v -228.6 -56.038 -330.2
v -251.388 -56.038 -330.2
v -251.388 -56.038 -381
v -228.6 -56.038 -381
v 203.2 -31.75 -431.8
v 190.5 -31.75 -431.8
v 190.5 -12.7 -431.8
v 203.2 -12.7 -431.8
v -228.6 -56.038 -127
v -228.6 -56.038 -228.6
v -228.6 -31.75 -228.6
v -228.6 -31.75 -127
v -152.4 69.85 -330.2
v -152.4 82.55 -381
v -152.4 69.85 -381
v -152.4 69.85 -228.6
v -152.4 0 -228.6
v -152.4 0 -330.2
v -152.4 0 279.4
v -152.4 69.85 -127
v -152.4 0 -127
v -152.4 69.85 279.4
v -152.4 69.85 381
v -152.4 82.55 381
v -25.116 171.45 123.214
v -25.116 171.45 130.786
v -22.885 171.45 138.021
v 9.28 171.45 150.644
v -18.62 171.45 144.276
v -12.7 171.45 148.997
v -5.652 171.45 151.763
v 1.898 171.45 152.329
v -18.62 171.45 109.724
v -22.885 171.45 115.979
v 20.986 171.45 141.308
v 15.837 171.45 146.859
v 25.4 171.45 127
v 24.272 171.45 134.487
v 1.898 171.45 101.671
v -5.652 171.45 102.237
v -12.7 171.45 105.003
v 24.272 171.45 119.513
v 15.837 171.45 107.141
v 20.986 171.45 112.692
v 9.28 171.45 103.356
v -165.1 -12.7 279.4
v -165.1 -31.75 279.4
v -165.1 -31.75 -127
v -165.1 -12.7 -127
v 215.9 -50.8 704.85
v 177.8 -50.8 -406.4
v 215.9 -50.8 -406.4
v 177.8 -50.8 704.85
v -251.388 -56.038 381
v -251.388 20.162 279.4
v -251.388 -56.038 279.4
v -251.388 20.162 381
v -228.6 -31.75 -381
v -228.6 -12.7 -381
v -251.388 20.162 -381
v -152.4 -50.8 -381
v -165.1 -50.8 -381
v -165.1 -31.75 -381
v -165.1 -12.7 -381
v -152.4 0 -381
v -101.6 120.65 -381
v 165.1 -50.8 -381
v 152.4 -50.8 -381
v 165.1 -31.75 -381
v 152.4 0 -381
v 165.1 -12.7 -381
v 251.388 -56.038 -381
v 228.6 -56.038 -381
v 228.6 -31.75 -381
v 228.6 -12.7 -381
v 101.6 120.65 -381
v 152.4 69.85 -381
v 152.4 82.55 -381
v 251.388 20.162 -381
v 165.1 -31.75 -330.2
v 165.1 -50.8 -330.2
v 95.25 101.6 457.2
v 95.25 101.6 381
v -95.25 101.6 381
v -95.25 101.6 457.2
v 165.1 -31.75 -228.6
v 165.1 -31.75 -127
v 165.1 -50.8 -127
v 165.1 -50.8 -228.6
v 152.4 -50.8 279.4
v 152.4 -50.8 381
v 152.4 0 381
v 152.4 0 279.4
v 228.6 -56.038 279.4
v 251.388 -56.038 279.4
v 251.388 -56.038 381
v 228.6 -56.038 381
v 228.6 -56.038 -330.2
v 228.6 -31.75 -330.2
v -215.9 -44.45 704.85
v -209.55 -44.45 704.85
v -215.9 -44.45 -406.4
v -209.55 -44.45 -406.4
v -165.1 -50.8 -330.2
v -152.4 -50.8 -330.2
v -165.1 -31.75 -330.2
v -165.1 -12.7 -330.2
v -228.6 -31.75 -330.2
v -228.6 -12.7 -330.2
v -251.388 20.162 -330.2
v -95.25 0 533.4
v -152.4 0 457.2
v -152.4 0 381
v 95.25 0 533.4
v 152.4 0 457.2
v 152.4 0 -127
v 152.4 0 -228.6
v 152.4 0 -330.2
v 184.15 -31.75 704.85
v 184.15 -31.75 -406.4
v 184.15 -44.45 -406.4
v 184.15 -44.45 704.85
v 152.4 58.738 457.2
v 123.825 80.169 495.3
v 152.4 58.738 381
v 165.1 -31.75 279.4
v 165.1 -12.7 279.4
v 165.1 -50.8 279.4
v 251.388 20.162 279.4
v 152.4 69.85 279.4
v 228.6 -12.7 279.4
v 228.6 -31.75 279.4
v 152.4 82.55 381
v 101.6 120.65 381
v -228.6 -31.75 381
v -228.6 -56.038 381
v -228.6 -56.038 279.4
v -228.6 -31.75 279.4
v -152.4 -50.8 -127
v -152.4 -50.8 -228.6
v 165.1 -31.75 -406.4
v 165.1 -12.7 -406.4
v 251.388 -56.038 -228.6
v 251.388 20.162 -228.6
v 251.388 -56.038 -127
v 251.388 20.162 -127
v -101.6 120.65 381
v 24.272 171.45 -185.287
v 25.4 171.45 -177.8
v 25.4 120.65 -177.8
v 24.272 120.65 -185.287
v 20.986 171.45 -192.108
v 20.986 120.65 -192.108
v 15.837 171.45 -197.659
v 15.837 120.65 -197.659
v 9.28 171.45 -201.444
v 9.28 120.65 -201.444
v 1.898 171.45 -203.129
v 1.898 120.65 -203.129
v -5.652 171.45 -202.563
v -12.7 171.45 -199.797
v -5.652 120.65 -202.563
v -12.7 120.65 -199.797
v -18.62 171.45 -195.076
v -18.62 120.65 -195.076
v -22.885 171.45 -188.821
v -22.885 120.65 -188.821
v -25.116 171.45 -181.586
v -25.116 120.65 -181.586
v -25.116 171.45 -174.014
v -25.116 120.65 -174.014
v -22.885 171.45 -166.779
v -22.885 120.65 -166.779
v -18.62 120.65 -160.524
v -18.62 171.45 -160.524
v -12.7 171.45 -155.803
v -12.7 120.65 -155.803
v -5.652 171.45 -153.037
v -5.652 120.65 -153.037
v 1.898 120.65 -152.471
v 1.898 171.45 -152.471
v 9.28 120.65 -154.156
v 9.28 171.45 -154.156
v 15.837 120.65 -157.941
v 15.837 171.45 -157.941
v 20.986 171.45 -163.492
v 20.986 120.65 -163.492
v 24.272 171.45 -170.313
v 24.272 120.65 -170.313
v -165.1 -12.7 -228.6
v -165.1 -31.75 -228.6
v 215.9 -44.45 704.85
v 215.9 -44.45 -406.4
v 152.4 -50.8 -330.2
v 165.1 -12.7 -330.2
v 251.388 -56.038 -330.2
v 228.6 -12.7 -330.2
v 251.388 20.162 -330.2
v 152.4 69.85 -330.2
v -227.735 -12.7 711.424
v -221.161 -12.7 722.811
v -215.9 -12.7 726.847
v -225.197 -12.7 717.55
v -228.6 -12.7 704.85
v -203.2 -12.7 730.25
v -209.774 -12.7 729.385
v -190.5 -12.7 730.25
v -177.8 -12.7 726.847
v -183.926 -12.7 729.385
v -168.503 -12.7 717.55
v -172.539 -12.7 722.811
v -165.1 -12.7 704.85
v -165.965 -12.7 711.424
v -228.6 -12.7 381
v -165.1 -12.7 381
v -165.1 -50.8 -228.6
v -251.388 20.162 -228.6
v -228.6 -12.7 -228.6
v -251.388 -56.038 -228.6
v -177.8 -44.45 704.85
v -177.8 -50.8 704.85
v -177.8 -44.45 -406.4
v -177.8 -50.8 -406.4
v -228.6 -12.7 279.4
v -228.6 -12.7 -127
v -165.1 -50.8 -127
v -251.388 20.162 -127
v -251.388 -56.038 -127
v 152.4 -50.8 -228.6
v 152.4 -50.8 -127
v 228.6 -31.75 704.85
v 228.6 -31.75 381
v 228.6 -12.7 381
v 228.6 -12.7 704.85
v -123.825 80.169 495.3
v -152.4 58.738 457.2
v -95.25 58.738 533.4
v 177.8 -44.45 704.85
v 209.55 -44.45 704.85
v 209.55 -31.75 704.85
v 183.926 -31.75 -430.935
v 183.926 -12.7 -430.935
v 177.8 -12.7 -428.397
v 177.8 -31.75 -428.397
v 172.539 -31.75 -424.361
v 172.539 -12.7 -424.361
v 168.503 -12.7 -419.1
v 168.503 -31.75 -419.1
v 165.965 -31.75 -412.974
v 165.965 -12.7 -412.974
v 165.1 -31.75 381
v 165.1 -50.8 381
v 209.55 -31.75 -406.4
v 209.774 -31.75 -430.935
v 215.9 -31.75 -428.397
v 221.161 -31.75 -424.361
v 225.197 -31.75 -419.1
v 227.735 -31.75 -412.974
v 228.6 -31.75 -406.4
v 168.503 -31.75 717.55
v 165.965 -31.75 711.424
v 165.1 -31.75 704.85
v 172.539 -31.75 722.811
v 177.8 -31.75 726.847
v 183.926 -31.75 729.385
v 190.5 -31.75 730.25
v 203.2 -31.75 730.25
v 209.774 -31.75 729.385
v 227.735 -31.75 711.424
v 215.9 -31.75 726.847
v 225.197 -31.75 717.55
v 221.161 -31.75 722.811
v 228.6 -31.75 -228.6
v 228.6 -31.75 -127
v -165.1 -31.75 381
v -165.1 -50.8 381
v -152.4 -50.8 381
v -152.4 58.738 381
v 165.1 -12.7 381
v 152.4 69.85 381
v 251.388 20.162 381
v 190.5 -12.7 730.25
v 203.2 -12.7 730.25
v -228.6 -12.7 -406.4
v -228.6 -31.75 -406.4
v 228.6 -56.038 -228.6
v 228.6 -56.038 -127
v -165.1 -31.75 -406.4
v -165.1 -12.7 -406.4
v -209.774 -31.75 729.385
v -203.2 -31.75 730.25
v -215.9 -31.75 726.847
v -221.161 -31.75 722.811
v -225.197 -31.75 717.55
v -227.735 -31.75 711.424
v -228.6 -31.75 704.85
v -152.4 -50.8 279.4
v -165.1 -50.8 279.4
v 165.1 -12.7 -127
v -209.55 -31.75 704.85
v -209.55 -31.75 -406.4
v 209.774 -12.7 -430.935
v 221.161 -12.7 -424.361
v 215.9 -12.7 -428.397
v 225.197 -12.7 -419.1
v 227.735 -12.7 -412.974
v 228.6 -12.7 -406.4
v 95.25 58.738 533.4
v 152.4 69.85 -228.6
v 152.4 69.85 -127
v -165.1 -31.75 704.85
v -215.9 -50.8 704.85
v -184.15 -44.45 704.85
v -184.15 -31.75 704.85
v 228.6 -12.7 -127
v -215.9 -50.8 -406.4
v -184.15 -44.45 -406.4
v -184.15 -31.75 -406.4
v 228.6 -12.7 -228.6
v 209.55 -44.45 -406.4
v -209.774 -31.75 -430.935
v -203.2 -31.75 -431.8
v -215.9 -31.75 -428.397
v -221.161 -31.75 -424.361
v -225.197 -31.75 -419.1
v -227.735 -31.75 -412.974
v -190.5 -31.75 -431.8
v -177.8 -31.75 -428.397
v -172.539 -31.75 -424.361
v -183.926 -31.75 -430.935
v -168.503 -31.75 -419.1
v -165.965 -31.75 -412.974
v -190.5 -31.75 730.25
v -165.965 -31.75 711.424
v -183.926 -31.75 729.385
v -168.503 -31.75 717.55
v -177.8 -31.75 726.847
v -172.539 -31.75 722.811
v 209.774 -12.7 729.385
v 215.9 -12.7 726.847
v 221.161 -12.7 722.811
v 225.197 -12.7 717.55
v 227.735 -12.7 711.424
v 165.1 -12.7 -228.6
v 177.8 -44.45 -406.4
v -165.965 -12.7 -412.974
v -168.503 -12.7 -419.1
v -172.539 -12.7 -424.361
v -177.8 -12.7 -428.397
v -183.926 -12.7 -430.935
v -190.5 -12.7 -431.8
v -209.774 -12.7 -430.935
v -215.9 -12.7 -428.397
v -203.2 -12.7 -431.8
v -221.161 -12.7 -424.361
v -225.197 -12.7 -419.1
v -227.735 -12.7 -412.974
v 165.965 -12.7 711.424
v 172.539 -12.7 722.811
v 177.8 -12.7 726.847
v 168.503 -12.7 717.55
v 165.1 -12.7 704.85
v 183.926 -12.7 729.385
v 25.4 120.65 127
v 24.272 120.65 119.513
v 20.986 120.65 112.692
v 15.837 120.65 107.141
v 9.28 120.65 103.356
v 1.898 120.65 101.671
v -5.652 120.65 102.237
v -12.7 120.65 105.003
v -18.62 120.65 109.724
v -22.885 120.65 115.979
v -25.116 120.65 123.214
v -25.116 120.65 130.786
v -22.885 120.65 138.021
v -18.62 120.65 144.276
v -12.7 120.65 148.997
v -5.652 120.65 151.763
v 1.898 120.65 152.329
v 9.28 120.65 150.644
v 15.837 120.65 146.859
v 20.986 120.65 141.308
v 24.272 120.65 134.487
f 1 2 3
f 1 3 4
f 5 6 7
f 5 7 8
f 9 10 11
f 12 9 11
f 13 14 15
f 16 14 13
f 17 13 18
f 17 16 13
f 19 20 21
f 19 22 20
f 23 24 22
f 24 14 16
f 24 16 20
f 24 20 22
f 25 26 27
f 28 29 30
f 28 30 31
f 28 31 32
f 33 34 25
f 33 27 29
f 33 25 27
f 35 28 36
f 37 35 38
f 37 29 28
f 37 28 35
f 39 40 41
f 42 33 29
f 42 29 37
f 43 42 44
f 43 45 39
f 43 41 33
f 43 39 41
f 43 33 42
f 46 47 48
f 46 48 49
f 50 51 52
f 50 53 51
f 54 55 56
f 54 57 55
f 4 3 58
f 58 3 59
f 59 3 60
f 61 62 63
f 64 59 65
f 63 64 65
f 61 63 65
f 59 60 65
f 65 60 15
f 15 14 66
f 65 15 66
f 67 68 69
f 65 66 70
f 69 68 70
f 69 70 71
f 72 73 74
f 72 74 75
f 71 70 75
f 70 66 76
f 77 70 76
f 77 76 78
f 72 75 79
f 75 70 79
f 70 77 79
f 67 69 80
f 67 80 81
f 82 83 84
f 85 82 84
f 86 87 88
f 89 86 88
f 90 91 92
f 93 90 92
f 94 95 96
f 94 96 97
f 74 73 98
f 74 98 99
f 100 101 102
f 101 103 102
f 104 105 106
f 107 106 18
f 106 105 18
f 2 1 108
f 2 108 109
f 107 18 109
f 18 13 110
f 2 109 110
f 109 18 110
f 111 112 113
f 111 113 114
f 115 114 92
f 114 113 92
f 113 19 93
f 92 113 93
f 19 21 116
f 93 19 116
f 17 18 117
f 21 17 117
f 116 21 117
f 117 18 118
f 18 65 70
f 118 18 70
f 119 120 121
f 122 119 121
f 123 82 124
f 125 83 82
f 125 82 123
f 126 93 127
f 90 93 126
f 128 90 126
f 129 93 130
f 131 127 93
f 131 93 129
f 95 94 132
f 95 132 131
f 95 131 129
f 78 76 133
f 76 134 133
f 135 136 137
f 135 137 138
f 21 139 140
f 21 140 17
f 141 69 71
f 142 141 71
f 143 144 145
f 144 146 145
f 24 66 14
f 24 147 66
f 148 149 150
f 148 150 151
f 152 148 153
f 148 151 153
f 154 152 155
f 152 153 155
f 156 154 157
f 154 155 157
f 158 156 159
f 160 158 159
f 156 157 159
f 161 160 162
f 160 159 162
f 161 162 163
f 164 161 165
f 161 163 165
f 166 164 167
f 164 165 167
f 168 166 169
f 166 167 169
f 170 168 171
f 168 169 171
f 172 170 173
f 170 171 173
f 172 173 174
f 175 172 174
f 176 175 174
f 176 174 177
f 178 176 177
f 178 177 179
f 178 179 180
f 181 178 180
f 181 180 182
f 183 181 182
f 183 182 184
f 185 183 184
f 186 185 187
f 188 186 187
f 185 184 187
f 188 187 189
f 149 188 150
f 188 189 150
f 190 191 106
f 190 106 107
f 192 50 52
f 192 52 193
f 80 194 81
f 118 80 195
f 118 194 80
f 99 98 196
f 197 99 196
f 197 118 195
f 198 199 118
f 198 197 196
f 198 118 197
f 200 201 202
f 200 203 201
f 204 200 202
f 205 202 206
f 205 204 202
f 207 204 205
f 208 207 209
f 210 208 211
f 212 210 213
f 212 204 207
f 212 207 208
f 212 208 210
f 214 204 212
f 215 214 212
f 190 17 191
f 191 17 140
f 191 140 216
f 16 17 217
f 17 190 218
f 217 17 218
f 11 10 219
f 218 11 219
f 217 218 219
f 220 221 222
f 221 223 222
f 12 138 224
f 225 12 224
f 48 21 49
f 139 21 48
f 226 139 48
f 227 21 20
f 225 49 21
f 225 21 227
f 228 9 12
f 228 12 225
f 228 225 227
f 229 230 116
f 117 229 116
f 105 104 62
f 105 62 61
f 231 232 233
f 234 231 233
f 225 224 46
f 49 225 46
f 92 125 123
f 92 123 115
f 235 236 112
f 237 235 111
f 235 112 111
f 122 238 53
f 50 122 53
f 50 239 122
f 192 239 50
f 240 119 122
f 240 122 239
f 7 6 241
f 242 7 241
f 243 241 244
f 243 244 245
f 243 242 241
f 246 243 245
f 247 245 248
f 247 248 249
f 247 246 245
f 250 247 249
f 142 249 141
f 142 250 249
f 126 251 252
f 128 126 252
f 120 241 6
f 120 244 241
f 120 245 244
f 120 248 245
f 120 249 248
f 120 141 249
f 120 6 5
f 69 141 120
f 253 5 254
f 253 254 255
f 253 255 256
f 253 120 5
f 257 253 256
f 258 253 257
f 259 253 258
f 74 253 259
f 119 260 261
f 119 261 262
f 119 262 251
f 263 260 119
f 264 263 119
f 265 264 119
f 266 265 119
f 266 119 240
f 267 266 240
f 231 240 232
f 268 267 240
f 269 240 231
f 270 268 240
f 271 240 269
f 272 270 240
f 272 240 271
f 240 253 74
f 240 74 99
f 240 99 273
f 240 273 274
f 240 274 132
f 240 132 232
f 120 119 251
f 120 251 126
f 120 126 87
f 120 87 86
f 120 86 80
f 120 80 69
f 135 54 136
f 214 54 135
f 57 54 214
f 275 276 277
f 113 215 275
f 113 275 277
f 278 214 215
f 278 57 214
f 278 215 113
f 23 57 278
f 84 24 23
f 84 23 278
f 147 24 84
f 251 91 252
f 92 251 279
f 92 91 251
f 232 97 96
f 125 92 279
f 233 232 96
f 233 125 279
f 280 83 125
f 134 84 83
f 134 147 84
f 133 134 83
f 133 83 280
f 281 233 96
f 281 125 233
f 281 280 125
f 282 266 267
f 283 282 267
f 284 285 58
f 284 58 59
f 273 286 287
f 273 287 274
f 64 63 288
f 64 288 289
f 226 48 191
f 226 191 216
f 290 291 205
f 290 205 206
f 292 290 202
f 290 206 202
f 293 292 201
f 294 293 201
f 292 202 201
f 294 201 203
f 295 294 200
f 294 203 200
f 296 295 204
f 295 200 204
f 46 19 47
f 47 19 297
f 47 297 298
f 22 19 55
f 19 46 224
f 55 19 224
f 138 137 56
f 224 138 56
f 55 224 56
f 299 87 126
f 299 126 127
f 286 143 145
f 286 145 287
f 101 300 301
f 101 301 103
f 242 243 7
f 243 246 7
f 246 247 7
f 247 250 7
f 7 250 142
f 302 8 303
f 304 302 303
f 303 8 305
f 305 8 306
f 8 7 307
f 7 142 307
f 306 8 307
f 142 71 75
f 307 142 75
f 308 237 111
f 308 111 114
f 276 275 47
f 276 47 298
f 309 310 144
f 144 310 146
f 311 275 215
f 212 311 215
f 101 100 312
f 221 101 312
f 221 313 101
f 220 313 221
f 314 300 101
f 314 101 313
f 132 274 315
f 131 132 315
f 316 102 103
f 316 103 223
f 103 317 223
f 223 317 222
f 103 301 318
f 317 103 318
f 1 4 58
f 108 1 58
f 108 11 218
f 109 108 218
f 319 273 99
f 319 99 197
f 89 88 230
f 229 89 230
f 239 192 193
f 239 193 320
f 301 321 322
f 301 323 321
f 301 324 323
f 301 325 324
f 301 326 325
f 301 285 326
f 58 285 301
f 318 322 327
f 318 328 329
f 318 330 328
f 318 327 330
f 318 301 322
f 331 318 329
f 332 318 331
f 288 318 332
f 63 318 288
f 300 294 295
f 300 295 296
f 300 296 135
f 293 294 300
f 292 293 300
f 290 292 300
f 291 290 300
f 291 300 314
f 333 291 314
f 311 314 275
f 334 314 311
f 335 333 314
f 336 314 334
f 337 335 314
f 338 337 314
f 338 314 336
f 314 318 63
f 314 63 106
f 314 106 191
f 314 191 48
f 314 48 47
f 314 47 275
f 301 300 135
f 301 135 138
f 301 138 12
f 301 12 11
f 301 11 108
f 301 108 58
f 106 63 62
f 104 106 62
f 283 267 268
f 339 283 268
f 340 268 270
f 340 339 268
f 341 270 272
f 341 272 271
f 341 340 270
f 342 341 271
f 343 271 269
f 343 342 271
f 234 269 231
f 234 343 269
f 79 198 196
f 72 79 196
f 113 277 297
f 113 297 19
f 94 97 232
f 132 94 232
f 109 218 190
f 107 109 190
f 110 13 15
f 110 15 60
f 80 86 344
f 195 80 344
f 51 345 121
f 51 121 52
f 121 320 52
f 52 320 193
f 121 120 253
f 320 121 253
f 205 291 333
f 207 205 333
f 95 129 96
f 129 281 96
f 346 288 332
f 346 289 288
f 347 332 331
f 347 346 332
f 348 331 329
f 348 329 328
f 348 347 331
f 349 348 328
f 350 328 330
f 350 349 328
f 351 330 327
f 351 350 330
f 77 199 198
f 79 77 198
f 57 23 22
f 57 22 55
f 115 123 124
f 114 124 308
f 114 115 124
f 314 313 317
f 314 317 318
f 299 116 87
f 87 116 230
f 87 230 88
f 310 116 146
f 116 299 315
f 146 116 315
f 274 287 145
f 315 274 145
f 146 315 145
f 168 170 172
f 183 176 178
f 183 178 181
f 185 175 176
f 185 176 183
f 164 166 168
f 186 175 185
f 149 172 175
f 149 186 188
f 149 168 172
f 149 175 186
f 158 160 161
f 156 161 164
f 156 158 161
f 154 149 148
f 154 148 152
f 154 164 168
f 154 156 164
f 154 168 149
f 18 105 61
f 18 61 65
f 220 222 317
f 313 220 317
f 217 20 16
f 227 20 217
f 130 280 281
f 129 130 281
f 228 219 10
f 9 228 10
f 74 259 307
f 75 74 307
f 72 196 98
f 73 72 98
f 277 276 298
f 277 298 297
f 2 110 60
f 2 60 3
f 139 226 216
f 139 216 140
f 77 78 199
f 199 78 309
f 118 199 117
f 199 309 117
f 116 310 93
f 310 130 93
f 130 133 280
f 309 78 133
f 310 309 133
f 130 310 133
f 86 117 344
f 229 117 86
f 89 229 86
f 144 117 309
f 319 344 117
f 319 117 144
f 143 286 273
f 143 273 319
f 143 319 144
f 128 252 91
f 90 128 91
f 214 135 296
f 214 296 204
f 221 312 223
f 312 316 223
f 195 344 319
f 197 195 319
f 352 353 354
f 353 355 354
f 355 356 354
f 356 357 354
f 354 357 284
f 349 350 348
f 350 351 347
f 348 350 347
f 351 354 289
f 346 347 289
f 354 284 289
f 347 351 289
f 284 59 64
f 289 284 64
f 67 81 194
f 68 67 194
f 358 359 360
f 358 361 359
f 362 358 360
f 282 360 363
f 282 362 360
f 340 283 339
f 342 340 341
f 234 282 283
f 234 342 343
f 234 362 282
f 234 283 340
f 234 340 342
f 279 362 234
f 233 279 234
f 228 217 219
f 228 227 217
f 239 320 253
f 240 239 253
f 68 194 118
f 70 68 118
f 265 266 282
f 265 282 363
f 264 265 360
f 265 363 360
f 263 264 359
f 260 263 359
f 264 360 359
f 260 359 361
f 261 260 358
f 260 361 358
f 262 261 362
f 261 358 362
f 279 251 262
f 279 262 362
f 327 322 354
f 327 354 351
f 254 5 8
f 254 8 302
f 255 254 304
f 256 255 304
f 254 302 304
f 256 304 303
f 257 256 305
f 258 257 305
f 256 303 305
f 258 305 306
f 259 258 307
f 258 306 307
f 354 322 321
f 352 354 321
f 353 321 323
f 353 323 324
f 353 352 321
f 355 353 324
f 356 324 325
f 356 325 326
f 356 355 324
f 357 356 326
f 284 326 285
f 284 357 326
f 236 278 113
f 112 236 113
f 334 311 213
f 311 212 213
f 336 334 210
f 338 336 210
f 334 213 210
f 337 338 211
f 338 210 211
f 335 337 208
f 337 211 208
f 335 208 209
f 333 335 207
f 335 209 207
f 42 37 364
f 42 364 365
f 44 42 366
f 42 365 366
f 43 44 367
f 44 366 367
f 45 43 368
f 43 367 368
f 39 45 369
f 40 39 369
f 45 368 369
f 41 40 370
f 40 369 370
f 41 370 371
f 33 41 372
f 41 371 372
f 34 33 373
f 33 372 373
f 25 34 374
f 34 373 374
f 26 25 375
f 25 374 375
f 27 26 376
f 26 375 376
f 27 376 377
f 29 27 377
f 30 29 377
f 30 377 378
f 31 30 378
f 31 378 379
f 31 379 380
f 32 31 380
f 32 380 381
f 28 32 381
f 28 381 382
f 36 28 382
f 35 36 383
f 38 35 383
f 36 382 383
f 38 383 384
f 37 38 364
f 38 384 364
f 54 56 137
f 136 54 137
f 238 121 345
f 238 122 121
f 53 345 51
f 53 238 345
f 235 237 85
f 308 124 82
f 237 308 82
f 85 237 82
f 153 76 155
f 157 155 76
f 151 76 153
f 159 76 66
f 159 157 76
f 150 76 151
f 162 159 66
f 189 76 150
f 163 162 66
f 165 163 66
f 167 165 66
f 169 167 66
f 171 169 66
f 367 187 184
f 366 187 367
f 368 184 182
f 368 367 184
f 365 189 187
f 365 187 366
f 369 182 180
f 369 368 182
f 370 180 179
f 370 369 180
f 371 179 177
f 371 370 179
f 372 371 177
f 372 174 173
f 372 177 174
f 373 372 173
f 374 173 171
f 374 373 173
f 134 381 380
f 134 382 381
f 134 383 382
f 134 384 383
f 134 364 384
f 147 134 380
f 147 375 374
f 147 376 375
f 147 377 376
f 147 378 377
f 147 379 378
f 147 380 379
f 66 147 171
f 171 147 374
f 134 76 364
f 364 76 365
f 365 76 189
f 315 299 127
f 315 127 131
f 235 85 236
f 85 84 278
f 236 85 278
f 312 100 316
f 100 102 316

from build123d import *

# Parameters (mm, degrees)
BOSS_EXTRUDE1_DEPTH      = 381
SKETCH3_W                = 98.988046958
SKETCH3_H                = 406.4
SKETCH3_H_2              = 101.6
CUT_EXTRUDE1_DEPTH       = 121.65
CUT_EXTRUDE1_DEPTH_BACK  = 57.038415052
BOSS_EXTRUDE2_DEPTH      = 152.4
CUT_EXTRUDE2_DEPTH       = 252.388046958
CUT_EXTRUDE2_DEPTH_BACK  = 1
CUT_EXTRUDE3_DEPTH       = 121.65
CUT_EXTRUDE3_DEPTH_BACK  = 57.038415052
SKETCH8_W                = 63.5
SKETCH8_H                = 19.05
BOSS_EXTRUDE3_DEPTH      = 730.25
BOSS_EXTRUDE3_DEPTH_BACK = 431.8
FILLET1_R                = 25.4
BOSS_EXTRUDE4_DEPTH      = 704.85
BOSS_EXTRUDE4_DEPTH_BACK = 406.4
SKETCH10_R               = 25.4
BOSS_EXTRUDE5_DEPTH      = 50.8


with BuildPart() as part:
    # Sketch2 → Boss-Extrude1 (new body, symmetric)
    with BuildSketch(Plane.XY):
        Polygon((152.4, 0), (0, 0), (0, 120.65), (101.6, 120.65), (152.4, 82.55), (152.4, 69.85), (251.388046958, 20.161584948), (251.388046958, -56.038415052), (228.6, -56.038415052), (228.6, -12.7), (165.1, -12.7), (165.1, -50.8), (152.4, -50.8), align=None)
    extrude(amount=BOSS_EXTRUDE1_DEPTH, both=True)

    # Sketch3 → Cut-Extrude1 (cut, two sides)
    with BuildSketch(Plane(origin=(0, 0, 0), x_dir=(1, 0, 0), z_dir=(0, 1, 0))) as cut_extrude1_sk:
        with Locations((201.894023479, -76.2)):
            Rectangle(SKETCH3_W, SKETCH3_H)
        with Locations((201.894023479, 279.4)):
            Rectangle(SKETCH3_W, SKETCH3_H_2)
    extrude(amount=CUT_EXTRUDE1_DEPTH, mode=Mode.SUBTRACT)
    extrude(cut_extrude1_sk.sketch, amount=-CUT_EXTRUDE1_DEPTH_BACK, mode=Mode.SUBTRACT)

    # Sketch4 → Boss-Extrude2 (add)
    with BuildSketch(Plane.XY.offset(381)):
        Polygon((152.4, 0), (0, 0), (0, 101.6), (95.25, 101.6), (152.4, 58.7375), align=None)
    extrude(amount=BOSS_EXTRUDE2_DEPTH)

    # Sketch6 → Cut-Extrude2 (cut, two sides)
    with BuildSketch(Plane(origin=(0, 0, 0), x_dir=(0, 0, -1), z_dir=(1, 0, 0))) as cut_extrude2_sk:
        Polygon((-533.4, 101.6), (-533.4, 58.7375), (-457.2, 101.6), align=None)
    extrude(amount=CUT_EXTRUDE2_DEPTH, mode=Mode.SUBTRACT)
    extrude(cut_extrude2_sk.sketch, amount=-CUT_EXTRUDE2_DEPTH_BACK, mode=Mode.SUBTRACT)

    # Sketch7 → Cut-Extrude3 (cut, two sides)
    with BuildSketch(Plane(origin=(0, 0, 0), x_dir=(1, 0, 0), z_dir=(0, 1, 0))) as cut_extrude3_sk:
        Polygon((152.4, -533.4), (152.4, -457.2), (95.25, -533.4), align=None)
    extrude(amount=CUT_EXTRUDE3_DEPTH, mode=Mode.SUBTRACT)
    extrude(cut_extrude3_sk.sketch, amount=-CUT_EXTRUDE3_DEPTH_BACK, mode=Mode.SUBTRACT)

    # Mirror1: part across plane


with BuildPart() as part_1:
    add(part.part)
    add(part.part.mirror(Plane(origin=(0, 0, 0), x_dir=(0, 0, 1), z_dir=(1, 0, 0))))

    # Sketch8 → Boss-Extrude3 (add, two sides)
    with BuildSketch(Plane.XY) as boss_extrude3_sk:
        with Locations((-196.85, -22.225)):
            Rectangle(SKETCH8_W, SKETCH8_H)
        with Locations((196.85, -22.225)):
            Rectangle(SKETCH8_W, SKETCH8_H)
    extrude(amount=BOSS_EXTRUDE3_DEPTH)
    extrude(boss_extrude3_sk.sketch, amount=-BOSS_EXTRUDE3_DEPTH_BACK)

    # Fillet1
    fillet1_edges = [part_1.edges().sort_by_distance(p)[0] for p in [
        (-165.1, -22.225, 730.25),
        (-228.6, -22.225, 730.25),
        (-228.6, -22.225, -431.8),
        (-165.1, -22.225, -431.8),
        (228.6, -22.225, 730.25),
        (165.1, -22.225, 730.25),
        (165.1, -22.225, -431.8),
        (228.6, -22.225, -431.8),
    ]]
    fillet(fillet1_edges, radius=FILLET1_R)

    # Sketch9 → Boss-Extrude4 (add, two sides)
    with BuildSketch(Plane.XY) as boss_extrude4_sk:
        Polygon((177.8, -50.8), (215.9, -50.8), (215.9, -44.45), (209.55, -44.45), (209.55, -31.75), (184.15, -31.75), (184.15, -44.45), (177.8, -44.45), align=None)
        Polygon((-184.15, -44.45), (-184.15, -31.75), (-209.55, -31.75), (-209.55, -44.45), (-215.9, -44.45), (-215.9, -50.8), (-177.8, -50.8), (-177.8, -44.45), align=None)
    extrude(amount=BOSS_EXTRUDE4_DEPTH)
    extrude(boss_extrude4_sk.sketch, amount=-BOSS_EXTRUDE4_DEPTH_BACK)

    # Sketch10 → Boss-Extrude5 (add)
    with BuildSketch(Plane(origin=(0, 120.65, 0), x_dir=(1, 0, 0), z_dir=(0, 1, 0))):
        with Locations((0, 177.8)):
            Circle(SKETCH10_R)
        with Locations((0, -127)):
            Circle(SKETCH10_R)
    extrude(amount=BOSS_EXTRUDE5_DEPTH)


solid = part_1.part
